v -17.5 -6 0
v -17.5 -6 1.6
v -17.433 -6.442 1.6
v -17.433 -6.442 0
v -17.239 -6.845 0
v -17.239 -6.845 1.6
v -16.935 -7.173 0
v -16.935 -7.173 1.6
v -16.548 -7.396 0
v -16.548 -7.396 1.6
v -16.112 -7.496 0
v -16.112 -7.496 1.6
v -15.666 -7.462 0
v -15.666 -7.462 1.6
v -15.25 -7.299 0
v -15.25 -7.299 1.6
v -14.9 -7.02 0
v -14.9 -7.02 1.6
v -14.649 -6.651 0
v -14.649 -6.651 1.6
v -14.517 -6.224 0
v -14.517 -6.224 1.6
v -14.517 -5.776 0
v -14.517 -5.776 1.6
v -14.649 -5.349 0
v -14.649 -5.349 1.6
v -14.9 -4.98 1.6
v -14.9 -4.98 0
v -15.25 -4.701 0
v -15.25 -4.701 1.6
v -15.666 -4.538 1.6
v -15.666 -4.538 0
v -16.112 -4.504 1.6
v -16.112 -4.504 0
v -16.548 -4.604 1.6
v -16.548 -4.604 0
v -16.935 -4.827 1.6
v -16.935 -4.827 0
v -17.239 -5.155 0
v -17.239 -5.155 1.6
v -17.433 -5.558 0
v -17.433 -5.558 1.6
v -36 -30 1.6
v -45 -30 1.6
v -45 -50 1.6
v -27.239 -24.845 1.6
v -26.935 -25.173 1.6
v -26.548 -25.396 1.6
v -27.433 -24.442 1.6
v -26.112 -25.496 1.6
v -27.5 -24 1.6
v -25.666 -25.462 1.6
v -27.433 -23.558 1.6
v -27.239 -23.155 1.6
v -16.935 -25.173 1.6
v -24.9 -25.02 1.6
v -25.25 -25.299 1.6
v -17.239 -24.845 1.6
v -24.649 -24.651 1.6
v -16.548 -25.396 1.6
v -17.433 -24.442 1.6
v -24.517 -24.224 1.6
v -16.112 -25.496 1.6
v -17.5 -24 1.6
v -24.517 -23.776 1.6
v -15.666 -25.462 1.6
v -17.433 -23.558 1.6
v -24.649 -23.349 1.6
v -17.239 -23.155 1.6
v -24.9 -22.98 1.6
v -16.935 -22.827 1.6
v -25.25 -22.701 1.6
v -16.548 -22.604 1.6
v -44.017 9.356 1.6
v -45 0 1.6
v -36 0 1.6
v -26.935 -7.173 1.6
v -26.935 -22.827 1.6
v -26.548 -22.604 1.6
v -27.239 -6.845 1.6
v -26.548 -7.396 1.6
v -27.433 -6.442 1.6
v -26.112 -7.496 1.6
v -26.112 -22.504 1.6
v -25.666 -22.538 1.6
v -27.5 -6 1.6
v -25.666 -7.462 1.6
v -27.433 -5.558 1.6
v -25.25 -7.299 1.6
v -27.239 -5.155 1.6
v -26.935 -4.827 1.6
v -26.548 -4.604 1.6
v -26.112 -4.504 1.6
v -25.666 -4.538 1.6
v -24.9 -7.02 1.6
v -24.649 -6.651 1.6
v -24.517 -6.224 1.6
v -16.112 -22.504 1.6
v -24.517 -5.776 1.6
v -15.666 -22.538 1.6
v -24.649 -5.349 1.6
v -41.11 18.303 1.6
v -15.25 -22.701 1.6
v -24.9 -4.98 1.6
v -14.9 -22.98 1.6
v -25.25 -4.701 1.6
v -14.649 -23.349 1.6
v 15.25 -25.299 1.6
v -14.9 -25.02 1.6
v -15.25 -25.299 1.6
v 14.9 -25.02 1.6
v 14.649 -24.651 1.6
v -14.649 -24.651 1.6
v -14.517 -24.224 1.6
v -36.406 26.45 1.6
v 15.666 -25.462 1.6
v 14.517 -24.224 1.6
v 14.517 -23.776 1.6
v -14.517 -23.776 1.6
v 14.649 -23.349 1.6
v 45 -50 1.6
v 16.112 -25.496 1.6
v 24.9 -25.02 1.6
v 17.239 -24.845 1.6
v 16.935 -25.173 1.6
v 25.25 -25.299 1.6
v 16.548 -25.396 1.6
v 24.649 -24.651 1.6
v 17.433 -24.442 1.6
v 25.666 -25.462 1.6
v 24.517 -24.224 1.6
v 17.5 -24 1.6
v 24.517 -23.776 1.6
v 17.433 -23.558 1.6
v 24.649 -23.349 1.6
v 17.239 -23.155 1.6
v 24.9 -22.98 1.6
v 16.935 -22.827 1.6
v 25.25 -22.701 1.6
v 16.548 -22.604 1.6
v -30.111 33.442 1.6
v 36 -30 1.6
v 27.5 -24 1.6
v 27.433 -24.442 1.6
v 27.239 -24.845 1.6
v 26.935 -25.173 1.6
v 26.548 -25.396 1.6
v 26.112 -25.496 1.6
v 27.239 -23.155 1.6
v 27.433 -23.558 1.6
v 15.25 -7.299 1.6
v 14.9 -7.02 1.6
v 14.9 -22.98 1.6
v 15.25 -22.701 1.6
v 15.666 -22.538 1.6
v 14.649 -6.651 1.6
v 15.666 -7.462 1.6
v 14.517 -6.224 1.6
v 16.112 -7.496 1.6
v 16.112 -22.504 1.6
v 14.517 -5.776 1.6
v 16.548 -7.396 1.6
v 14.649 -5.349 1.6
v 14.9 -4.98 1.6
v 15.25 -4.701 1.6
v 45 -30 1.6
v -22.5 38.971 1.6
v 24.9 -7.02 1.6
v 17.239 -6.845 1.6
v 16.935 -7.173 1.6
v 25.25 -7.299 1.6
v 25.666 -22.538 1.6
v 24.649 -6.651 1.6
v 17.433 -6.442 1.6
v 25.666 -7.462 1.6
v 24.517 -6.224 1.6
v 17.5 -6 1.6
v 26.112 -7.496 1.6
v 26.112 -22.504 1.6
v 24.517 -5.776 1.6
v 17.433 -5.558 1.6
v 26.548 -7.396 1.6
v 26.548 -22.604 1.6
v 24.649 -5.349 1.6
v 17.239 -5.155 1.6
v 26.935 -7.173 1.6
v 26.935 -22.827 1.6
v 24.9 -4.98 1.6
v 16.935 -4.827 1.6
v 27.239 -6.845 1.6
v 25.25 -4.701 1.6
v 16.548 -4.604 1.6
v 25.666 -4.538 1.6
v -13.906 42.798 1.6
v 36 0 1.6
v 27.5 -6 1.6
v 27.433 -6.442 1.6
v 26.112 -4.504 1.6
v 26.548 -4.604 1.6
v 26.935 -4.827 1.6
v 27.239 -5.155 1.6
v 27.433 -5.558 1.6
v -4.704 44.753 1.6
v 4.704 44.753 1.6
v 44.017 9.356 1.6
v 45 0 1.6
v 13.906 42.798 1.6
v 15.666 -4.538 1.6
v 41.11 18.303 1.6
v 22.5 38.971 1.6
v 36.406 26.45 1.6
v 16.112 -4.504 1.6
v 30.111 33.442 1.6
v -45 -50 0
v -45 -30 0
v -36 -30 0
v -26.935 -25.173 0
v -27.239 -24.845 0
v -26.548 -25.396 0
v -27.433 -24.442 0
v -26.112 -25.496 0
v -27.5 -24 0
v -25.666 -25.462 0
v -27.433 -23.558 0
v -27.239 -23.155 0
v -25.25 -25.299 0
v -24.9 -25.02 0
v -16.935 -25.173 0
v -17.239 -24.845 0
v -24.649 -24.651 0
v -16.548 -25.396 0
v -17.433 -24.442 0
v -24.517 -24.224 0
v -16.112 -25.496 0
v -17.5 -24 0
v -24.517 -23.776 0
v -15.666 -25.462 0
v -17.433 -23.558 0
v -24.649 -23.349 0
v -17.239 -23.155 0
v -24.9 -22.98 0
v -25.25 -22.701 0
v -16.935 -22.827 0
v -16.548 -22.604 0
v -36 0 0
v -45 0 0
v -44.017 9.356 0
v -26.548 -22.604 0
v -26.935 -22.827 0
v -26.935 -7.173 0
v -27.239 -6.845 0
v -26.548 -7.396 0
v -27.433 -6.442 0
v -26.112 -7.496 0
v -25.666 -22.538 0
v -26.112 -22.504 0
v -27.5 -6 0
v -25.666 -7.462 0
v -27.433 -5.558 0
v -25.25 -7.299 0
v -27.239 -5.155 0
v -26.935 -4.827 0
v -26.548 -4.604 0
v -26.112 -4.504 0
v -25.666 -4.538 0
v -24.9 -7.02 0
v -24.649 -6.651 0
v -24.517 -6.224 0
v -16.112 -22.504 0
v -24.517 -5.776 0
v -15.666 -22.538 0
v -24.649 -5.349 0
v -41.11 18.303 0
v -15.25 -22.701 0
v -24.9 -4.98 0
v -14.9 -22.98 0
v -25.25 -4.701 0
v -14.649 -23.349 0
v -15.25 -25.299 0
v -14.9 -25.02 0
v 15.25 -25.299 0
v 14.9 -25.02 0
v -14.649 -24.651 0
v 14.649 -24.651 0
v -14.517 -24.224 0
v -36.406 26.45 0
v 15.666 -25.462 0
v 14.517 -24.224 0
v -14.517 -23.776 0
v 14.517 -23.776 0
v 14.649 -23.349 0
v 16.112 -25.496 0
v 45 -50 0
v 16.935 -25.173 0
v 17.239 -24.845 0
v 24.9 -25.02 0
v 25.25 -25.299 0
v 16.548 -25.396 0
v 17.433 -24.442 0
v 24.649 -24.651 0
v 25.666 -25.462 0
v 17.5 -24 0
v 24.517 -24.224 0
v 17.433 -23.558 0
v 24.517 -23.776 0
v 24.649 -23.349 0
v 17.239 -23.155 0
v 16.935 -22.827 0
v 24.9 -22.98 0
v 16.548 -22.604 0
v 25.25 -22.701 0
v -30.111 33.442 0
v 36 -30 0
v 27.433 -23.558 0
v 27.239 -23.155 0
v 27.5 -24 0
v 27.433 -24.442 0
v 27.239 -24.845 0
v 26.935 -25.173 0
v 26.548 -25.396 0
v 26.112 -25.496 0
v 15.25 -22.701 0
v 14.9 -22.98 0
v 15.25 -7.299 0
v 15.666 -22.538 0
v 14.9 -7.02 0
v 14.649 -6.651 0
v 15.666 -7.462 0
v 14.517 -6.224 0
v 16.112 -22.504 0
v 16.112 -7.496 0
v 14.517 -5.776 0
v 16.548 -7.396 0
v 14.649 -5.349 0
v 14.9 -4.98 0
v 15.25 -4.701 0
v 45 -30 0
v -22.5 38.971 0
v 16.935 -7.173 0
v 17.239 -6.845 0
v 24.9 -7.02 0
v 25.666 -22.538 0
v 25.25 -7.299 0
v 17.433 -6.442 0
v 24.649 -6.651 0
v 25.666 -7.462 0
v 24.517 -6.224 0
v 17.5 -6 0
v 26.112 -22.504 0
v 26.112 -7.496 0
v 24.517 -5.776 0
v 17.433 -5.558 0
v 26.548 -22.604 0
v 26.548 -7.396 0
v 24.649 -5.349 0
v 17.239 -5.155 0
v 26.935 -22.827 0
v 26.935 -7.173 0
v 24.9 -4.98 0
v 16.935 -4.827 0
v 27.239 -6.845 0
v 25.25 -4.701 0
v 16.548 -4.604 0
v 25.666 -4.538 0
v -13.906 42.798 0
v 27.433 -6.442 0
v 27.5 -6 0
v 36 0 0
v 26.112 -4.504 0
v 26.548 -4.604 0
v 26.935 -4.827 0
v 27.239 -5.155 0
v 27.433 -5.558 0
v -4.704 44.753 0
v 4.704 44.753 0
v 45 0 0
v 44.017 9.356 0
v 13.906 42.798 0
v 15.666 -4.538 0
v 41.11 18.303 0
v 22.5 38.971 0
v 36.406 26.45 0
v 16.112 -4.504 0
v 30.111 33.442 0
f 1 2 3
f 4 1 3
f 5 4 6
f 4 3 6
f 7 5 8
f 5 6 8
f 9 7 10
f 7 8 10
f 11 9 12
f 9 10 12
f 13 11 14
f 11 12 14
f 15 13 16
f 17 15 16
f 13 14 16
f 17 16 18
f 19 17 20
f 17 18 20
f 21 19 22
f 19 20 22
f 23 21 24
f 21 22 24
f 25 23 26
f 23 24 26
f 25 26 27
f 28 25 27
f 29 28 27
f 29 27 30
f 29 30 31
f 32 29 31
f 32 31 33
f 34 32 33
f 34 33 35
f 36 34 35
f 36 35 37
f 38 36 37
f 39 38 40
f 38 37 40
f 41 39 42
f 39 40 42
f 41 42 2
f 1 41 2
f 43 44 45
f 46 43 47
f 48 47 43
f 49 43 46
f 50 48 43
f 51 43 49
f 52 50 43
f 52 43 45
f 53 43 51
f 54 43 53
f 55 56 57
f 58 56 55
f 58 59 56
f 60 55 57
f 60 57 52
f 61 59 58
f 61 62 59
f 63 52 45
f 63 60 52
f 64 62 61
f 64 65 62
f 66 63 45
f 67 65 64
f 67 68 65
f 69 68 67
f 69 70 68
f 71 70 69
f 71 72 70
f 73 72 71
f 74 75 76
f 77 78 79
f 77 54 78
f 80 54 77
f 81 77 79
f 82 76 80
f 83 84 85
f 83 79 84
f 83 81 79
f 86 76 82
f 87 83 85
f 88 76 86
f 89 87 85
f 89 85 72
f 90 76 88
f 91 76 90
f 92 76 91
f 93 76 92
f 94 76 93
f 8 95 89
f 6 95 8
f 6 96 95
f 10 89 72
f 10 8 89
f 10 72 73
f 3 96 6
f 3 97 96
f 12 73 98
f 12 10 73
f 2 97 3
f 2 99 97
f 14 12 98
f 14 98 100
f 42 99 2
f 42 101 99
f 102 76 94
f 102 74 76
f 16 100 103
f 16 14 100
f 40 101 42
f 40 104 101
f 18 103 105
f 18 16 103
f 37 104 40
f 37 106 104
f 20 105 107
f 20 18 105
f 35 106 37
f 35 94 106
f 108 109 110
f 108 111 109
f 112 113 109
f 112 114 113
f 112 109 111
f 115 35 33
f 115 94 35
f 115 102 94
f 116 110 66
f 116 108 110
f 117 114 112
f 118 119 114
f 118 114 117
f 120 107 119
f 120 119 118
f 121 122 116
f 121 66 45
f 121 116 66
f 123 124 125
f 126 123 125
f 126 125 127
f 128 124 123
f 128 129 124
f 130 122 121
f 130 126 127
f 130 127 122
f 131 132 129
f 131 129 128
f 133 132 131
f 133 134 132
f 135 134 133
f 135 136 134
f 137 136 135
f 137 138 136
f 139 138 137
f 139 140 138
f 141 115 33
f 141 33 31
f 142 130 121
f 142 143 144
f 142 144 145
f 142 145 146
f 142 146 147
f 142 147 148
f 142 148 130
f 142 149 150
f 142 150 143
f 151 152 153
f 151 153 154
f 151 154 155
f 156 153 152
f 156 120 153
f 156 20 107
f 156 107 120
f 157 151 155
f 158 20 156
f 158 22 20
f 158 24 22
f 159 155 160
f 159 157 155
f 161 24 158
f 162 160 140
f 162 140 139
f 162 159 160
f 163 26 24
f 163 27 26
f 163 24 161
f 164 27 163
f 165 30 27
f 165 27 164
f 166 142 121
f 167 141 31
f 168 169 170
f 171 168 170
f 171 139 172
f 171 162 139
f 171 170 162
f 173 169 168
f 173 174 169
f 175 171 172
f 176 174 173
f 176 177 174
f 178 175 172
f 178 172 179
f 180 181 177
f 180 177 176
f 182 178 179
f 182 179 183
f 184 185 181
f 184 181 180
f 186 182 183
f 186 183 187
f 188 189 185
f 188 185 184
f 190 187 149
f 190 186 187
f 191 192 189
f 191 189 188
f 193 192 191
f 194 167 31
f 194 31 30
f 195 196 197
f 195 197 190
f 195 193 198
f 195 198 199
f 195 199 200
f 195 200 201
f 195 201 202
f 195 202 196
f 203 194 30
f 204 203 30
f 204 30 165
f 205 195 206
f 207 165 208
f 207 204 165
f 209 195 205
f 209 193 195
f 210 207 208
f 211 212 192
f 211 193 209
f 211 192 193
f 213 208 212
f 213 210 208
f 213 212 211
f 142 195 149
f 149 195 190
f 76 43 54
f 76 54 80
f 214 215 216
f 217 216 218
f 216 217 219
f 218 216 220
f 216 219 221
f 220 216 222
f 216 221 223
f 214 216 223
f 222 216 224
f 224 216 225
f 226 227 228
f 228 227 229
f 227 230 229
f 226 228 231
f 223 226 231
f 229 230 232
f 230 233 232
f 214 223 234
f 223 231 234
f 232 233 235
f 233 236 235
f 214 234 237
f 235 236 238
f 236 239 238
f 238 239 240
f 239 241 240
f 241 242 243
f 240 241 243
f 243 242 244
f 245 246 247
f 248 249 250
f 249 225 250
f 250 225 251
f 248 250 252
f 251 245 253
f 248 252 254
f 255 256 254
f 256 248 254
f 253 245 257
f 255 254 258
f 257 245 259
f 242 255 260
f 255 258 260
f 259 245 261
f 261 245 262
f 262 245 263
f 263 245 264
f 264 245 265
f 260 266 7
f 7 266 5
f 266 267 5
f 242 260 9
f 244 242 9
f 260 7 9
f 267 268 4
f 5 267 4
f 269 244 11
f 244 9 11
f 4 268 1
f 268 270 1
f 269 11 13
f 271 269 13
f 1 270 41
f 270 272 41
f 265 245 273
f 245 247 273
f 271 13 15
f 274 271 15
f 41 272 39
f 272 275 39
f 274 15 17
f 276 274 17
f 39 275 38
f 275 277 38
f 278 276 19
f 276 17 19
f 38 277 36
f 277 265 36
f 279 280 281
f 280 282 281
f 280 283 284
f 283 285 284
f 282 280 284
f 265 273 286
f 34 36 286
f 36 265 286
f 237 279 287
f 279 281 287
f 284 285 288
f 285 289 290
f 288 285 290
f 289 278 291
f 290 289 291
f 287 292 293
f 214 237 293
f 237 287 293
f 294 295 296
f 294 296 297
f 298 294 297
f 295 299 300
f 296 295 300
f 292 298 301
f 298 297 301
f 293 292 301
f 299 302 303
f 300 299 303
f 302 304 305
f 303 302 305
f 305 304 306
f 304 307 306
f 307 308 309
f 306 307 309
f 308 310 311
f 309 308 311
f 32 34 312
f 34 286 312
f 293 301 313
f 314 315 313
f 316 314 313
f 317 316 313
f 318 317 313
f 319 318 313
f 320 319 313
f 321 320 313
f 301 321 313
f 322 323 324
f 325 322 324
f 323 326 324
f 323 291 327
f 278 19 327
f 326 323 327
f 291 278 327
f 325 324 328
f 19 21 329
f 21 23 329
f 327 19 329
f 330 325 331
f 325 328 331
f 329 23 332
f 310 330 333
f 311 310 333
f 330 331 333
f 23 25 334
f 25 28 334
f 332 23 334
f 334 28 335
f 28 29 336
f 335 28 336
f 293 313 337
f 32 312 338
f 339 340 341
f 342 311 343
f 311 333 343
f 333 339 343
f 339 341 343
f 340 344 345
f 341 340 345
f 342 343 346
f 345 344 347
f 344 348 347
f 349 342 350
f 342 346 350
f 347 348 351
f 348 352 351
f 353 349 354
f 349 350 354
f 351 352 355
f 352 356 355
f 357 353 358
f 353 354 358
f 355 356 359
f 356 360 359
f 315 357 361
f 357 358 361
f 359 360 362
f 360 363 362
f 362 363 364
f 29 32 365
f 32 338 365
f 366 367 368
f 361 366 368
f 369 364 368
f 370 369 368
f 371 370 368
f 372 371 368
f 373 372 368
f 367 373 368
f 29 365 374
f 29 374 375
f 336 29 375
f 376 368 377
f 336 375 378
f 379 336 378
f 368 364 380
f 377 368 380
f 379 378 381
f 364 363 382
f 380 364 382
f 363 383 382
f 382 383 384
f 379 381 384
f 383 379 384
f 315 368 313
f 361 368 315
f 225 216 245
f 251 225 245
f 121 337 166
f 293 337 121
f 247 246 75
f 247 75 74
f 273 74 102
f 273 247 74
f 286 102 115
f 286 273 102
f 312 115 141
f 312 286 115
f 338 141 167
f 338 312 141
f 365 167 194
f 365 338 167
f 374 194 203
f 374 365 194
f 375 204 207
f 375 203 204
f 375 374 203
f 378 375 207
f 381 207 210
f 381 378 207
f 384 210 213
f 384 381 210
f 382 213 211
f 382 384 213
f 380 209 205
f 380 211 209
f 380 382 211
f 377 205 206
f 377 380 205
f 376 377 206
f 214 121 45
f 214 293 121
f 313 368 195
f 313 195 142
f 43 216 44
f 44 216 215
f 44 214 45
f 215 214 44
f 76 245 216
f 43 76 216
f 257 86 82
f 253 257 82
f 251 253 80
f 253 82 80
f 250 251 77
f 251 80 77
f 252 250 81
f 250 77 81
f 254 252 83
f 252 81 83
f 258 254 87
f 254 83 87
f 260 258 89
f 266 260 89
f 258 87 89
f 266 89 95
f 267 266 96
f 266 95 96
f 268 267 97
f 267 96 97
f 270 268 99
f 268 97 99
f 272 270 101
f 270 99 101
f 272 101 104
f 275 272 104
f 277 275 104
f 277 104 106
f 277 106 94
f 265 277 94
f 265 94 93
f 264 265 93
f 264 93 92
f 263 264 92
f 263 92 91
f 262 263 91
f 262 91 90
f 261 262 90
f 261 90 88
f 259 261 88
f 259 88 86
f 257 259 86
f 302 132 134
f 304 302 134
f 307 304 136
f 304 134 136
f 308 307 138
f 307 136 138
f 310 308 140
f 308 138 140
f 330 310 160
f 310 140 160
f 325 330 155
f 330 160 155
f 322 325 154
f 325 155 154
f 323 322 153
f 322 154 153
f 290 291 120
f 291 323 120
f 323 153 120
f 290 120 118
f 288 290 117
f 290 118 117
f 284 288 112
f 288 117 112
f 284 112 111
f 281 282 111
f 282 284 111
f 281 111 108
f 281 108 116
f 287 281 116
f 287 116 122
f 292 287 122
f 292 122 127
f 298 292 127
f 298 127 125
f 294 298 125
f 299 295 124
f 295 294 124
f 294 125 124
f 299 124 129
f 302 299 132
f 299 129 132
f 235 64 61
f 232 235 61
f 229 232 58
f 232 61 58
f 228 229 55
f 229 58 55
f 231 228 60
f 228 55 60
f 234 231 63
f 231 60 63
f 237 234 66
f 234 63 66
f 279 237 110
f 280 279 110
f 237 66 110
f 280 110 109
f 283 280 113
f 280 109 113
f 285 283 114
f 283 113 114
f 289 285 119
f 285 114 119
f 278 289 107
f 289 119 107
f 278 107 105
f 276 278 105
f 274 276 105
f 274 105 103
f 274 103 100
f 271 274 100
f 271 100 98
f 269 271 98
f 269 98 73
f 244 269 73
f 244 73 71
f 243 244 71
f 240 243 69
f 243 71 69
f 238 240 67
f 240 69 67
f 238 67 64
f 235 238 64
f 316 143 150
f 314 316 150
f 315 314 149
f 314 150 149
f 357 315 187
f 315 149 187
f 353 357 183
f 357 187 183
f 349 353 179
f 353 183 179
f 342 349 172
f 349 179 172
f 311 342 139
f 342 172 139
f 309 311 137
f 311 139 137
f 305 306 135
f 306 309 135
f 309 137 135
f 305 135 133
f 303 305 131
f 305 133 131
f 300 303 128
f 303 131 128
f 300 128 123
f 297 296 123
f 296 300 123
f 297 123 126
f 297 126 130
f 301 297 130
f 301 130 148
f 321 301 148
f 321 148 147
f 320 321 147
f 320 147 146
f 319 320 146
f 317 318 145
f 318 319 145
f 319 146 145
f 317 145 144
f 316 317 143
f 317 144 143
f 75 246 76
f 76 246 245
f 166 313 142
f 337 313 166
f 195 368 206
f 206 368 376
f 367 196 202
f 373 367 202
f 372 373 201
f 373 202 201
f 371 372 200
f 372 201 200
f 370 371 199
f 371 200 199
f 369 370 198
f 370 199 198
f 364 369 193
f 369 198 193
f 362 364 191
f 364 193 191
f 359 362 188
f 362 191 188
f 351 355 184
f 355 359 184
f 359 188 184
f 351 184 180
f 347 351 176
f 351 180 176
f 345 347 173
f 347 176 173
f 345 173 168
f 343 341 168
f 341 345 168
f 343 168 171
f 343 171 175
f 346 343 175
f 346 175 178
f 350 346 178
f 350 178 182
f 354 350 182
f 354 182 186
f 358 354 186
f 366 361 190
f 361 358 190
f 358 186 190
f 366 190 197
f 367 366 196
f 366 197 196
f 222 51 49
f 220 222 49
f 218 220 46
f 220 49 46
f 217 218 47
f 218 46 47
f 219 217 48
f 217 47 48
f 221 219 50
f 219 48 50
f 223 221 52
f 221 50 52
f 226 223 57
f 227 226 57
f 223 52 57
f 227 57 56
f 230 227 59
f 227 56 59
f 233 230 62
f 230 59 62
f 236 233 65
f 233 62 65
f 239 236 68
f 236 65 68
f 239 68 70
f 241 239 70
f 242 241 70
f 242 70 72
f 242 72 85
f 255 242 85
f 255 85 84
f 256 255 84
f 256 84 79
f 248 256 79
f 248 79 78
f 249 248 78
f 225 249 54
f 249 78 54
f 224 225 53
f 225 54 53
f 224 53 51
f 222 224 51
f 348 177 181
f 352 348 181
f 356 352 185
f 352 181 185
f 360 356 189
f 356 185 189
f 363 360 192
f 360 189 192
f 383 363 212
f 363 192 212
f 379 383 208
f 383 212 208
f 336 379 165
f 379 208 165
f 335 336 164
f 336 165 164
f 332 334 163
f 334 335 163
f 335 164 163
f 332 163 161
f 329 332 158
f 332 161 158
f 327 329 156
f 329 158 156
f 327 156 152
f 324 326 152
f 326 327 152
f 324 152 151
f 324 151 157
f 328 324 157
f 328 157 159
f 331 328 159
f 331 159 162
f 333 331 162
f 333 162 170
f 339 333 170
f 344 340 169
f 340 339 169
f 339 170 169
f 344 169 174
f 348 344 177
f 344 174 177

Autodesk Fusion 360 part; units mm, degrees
sketch "Skizze1" plane through (0, 0, 0) normal (0, 0, 1) x (1, 0, 0)
  line L0 (45, -30) -> (45, -50)
  line L1 (45, -50) -> (-45, -50)
  line L2 (-45, -50) -> (-45, -30)
  arc A0 (45, 0) -> (-45, 0) centre (0, 0) ccw
  line L3 (-45, 0) -> (-36, 0)
  line L4 (-36, 0) -> (-36, -30)
  line L5 (-36, -30) -> (-45, -30)
  line L6 (36, 0) -> (36, -30)
  line L7 (36, -30) -> (45, -30)
  line L8 (36, 0) -> (45, 0)
  dimension "d1" = 90
  dimension "d2" = 50
  dimension "d3" = 9
  dimension "d4" = 30
  dimension "d5" = 9
  dimension "d6" = 30
extrude "Extrusion1" add sketch "Skizze1" along normal blind 1.6
sketch "Skizze2" plane through (0, 0, 1.6) normal (0, 0, 1) x (-1, 0, 0)
  line L0 (-36, 30) -> (-36, 0)
  line L1 (-36, 0) -> (-45, 0)
  arc A0 (-45, 0) -> (45, 0) centre (0, 0) ccw
  line L2 (45, 0) -> (36, 0)
  line L3 (36, 0) -> (36, 30)
  line L4 (36, 30) -> (45, 30)
  line L5 (45, 30) -> (45, 50)
  line L6 (45, 50) -> (-45, 50)
  line L7 (-45, 50) -> (-45, 30)
  line L8 (-45, 30) -> (-36, 30)
  line L9 (36, 15) -> (36, 24)
  line L10 (36, 15) -> (36, 6)
  circle A1 centre (26, 24) radius 1.5
  circle A2 centre (16, 24) radius 1.5
  circle A3 centre (26, 6) radius 1.5
  circle A4 centre (16, 6) radius 1.5
  line L11 (36, 15) -> (36, 9)
  line L12 (36, 9) -> (11, 9)
  line L13 (11, 9) -> (11, 21)
  line L14 (11, 21) -> (36, 21)
  line L15 (36, 21) -> (36, 9)
  line L16 (36, 24) -> (36, 27)
  line L17 (36, 27) -> (4, 27)
  line L18 (4, 27) -> (4, 2)
  line L19 (4, 2) -> (36, 2)
  line L20 (36, 2) -> (36, 27)
  line L21 (4, 27) -> (-36, 27)
  line L22 (-36, 27) -> (-4, 27)
  line L23 (-4, 27) -> (-4, 2)
  line L24 (-4, 2) -> (-36, 2)
  line L25 (-36, 2) -> (-36, 27)
  line L26 (-11, 21) -> (-36, 21)
  line L27 (-36, 21) -> (-11, 21)
  line L28 (-11, 21) -> (-11, 9)
  line L29 (-11, 9) -> (-36, 9)
  line L30 (-36, 9) -> (-36, 21)
  circle A5 centre (-16, 6) radius 1.5
  circle A6 centre (-26, 6) radius 1.5
  circle A7 centre (-16, 24) radius 1.5
  circle A8 centre (-26, 24) radius 1.5
  dimension "d10" = 9
  dimension "d11" = 9
  dimension "d12" = 10
  dimension "d13" = 10
  dimension "d14" = 10
  dimension "d15" = 10
  dimension "d16" = 3
  dimension "d17" = 3
  dimension "d18" = 3
  dimension "d19" = 3
  dimension "d20" = 6
  dimension "d21" = 25
  dimension "d22" = 12
  dimension "d23" = 3
  dimension "d24" = 32
  dimension "d25" = 25
  dimension "d30" = 32
  dimension "d31" = 25
  dimension "d32" = 25
  dimension "d33" = 12
  dimension "d35" = 10
  dimension "d37" = 10
  dimension "d38" = 3
  dimension "d39" = 3
  dimension "d40" = 3
  dimension "d41" = 3
  dimension "d42" = 10
  dimension "d43" = 10
extrude "Extrusion2" cut sketch "Skizze2" against normal blind 1.6 contours A1 | A2 | A3 | A4
mirror "Spiegeln1" about plane through (0, 0, 0) normal (1, 0, 0) of "Extrusion2"
